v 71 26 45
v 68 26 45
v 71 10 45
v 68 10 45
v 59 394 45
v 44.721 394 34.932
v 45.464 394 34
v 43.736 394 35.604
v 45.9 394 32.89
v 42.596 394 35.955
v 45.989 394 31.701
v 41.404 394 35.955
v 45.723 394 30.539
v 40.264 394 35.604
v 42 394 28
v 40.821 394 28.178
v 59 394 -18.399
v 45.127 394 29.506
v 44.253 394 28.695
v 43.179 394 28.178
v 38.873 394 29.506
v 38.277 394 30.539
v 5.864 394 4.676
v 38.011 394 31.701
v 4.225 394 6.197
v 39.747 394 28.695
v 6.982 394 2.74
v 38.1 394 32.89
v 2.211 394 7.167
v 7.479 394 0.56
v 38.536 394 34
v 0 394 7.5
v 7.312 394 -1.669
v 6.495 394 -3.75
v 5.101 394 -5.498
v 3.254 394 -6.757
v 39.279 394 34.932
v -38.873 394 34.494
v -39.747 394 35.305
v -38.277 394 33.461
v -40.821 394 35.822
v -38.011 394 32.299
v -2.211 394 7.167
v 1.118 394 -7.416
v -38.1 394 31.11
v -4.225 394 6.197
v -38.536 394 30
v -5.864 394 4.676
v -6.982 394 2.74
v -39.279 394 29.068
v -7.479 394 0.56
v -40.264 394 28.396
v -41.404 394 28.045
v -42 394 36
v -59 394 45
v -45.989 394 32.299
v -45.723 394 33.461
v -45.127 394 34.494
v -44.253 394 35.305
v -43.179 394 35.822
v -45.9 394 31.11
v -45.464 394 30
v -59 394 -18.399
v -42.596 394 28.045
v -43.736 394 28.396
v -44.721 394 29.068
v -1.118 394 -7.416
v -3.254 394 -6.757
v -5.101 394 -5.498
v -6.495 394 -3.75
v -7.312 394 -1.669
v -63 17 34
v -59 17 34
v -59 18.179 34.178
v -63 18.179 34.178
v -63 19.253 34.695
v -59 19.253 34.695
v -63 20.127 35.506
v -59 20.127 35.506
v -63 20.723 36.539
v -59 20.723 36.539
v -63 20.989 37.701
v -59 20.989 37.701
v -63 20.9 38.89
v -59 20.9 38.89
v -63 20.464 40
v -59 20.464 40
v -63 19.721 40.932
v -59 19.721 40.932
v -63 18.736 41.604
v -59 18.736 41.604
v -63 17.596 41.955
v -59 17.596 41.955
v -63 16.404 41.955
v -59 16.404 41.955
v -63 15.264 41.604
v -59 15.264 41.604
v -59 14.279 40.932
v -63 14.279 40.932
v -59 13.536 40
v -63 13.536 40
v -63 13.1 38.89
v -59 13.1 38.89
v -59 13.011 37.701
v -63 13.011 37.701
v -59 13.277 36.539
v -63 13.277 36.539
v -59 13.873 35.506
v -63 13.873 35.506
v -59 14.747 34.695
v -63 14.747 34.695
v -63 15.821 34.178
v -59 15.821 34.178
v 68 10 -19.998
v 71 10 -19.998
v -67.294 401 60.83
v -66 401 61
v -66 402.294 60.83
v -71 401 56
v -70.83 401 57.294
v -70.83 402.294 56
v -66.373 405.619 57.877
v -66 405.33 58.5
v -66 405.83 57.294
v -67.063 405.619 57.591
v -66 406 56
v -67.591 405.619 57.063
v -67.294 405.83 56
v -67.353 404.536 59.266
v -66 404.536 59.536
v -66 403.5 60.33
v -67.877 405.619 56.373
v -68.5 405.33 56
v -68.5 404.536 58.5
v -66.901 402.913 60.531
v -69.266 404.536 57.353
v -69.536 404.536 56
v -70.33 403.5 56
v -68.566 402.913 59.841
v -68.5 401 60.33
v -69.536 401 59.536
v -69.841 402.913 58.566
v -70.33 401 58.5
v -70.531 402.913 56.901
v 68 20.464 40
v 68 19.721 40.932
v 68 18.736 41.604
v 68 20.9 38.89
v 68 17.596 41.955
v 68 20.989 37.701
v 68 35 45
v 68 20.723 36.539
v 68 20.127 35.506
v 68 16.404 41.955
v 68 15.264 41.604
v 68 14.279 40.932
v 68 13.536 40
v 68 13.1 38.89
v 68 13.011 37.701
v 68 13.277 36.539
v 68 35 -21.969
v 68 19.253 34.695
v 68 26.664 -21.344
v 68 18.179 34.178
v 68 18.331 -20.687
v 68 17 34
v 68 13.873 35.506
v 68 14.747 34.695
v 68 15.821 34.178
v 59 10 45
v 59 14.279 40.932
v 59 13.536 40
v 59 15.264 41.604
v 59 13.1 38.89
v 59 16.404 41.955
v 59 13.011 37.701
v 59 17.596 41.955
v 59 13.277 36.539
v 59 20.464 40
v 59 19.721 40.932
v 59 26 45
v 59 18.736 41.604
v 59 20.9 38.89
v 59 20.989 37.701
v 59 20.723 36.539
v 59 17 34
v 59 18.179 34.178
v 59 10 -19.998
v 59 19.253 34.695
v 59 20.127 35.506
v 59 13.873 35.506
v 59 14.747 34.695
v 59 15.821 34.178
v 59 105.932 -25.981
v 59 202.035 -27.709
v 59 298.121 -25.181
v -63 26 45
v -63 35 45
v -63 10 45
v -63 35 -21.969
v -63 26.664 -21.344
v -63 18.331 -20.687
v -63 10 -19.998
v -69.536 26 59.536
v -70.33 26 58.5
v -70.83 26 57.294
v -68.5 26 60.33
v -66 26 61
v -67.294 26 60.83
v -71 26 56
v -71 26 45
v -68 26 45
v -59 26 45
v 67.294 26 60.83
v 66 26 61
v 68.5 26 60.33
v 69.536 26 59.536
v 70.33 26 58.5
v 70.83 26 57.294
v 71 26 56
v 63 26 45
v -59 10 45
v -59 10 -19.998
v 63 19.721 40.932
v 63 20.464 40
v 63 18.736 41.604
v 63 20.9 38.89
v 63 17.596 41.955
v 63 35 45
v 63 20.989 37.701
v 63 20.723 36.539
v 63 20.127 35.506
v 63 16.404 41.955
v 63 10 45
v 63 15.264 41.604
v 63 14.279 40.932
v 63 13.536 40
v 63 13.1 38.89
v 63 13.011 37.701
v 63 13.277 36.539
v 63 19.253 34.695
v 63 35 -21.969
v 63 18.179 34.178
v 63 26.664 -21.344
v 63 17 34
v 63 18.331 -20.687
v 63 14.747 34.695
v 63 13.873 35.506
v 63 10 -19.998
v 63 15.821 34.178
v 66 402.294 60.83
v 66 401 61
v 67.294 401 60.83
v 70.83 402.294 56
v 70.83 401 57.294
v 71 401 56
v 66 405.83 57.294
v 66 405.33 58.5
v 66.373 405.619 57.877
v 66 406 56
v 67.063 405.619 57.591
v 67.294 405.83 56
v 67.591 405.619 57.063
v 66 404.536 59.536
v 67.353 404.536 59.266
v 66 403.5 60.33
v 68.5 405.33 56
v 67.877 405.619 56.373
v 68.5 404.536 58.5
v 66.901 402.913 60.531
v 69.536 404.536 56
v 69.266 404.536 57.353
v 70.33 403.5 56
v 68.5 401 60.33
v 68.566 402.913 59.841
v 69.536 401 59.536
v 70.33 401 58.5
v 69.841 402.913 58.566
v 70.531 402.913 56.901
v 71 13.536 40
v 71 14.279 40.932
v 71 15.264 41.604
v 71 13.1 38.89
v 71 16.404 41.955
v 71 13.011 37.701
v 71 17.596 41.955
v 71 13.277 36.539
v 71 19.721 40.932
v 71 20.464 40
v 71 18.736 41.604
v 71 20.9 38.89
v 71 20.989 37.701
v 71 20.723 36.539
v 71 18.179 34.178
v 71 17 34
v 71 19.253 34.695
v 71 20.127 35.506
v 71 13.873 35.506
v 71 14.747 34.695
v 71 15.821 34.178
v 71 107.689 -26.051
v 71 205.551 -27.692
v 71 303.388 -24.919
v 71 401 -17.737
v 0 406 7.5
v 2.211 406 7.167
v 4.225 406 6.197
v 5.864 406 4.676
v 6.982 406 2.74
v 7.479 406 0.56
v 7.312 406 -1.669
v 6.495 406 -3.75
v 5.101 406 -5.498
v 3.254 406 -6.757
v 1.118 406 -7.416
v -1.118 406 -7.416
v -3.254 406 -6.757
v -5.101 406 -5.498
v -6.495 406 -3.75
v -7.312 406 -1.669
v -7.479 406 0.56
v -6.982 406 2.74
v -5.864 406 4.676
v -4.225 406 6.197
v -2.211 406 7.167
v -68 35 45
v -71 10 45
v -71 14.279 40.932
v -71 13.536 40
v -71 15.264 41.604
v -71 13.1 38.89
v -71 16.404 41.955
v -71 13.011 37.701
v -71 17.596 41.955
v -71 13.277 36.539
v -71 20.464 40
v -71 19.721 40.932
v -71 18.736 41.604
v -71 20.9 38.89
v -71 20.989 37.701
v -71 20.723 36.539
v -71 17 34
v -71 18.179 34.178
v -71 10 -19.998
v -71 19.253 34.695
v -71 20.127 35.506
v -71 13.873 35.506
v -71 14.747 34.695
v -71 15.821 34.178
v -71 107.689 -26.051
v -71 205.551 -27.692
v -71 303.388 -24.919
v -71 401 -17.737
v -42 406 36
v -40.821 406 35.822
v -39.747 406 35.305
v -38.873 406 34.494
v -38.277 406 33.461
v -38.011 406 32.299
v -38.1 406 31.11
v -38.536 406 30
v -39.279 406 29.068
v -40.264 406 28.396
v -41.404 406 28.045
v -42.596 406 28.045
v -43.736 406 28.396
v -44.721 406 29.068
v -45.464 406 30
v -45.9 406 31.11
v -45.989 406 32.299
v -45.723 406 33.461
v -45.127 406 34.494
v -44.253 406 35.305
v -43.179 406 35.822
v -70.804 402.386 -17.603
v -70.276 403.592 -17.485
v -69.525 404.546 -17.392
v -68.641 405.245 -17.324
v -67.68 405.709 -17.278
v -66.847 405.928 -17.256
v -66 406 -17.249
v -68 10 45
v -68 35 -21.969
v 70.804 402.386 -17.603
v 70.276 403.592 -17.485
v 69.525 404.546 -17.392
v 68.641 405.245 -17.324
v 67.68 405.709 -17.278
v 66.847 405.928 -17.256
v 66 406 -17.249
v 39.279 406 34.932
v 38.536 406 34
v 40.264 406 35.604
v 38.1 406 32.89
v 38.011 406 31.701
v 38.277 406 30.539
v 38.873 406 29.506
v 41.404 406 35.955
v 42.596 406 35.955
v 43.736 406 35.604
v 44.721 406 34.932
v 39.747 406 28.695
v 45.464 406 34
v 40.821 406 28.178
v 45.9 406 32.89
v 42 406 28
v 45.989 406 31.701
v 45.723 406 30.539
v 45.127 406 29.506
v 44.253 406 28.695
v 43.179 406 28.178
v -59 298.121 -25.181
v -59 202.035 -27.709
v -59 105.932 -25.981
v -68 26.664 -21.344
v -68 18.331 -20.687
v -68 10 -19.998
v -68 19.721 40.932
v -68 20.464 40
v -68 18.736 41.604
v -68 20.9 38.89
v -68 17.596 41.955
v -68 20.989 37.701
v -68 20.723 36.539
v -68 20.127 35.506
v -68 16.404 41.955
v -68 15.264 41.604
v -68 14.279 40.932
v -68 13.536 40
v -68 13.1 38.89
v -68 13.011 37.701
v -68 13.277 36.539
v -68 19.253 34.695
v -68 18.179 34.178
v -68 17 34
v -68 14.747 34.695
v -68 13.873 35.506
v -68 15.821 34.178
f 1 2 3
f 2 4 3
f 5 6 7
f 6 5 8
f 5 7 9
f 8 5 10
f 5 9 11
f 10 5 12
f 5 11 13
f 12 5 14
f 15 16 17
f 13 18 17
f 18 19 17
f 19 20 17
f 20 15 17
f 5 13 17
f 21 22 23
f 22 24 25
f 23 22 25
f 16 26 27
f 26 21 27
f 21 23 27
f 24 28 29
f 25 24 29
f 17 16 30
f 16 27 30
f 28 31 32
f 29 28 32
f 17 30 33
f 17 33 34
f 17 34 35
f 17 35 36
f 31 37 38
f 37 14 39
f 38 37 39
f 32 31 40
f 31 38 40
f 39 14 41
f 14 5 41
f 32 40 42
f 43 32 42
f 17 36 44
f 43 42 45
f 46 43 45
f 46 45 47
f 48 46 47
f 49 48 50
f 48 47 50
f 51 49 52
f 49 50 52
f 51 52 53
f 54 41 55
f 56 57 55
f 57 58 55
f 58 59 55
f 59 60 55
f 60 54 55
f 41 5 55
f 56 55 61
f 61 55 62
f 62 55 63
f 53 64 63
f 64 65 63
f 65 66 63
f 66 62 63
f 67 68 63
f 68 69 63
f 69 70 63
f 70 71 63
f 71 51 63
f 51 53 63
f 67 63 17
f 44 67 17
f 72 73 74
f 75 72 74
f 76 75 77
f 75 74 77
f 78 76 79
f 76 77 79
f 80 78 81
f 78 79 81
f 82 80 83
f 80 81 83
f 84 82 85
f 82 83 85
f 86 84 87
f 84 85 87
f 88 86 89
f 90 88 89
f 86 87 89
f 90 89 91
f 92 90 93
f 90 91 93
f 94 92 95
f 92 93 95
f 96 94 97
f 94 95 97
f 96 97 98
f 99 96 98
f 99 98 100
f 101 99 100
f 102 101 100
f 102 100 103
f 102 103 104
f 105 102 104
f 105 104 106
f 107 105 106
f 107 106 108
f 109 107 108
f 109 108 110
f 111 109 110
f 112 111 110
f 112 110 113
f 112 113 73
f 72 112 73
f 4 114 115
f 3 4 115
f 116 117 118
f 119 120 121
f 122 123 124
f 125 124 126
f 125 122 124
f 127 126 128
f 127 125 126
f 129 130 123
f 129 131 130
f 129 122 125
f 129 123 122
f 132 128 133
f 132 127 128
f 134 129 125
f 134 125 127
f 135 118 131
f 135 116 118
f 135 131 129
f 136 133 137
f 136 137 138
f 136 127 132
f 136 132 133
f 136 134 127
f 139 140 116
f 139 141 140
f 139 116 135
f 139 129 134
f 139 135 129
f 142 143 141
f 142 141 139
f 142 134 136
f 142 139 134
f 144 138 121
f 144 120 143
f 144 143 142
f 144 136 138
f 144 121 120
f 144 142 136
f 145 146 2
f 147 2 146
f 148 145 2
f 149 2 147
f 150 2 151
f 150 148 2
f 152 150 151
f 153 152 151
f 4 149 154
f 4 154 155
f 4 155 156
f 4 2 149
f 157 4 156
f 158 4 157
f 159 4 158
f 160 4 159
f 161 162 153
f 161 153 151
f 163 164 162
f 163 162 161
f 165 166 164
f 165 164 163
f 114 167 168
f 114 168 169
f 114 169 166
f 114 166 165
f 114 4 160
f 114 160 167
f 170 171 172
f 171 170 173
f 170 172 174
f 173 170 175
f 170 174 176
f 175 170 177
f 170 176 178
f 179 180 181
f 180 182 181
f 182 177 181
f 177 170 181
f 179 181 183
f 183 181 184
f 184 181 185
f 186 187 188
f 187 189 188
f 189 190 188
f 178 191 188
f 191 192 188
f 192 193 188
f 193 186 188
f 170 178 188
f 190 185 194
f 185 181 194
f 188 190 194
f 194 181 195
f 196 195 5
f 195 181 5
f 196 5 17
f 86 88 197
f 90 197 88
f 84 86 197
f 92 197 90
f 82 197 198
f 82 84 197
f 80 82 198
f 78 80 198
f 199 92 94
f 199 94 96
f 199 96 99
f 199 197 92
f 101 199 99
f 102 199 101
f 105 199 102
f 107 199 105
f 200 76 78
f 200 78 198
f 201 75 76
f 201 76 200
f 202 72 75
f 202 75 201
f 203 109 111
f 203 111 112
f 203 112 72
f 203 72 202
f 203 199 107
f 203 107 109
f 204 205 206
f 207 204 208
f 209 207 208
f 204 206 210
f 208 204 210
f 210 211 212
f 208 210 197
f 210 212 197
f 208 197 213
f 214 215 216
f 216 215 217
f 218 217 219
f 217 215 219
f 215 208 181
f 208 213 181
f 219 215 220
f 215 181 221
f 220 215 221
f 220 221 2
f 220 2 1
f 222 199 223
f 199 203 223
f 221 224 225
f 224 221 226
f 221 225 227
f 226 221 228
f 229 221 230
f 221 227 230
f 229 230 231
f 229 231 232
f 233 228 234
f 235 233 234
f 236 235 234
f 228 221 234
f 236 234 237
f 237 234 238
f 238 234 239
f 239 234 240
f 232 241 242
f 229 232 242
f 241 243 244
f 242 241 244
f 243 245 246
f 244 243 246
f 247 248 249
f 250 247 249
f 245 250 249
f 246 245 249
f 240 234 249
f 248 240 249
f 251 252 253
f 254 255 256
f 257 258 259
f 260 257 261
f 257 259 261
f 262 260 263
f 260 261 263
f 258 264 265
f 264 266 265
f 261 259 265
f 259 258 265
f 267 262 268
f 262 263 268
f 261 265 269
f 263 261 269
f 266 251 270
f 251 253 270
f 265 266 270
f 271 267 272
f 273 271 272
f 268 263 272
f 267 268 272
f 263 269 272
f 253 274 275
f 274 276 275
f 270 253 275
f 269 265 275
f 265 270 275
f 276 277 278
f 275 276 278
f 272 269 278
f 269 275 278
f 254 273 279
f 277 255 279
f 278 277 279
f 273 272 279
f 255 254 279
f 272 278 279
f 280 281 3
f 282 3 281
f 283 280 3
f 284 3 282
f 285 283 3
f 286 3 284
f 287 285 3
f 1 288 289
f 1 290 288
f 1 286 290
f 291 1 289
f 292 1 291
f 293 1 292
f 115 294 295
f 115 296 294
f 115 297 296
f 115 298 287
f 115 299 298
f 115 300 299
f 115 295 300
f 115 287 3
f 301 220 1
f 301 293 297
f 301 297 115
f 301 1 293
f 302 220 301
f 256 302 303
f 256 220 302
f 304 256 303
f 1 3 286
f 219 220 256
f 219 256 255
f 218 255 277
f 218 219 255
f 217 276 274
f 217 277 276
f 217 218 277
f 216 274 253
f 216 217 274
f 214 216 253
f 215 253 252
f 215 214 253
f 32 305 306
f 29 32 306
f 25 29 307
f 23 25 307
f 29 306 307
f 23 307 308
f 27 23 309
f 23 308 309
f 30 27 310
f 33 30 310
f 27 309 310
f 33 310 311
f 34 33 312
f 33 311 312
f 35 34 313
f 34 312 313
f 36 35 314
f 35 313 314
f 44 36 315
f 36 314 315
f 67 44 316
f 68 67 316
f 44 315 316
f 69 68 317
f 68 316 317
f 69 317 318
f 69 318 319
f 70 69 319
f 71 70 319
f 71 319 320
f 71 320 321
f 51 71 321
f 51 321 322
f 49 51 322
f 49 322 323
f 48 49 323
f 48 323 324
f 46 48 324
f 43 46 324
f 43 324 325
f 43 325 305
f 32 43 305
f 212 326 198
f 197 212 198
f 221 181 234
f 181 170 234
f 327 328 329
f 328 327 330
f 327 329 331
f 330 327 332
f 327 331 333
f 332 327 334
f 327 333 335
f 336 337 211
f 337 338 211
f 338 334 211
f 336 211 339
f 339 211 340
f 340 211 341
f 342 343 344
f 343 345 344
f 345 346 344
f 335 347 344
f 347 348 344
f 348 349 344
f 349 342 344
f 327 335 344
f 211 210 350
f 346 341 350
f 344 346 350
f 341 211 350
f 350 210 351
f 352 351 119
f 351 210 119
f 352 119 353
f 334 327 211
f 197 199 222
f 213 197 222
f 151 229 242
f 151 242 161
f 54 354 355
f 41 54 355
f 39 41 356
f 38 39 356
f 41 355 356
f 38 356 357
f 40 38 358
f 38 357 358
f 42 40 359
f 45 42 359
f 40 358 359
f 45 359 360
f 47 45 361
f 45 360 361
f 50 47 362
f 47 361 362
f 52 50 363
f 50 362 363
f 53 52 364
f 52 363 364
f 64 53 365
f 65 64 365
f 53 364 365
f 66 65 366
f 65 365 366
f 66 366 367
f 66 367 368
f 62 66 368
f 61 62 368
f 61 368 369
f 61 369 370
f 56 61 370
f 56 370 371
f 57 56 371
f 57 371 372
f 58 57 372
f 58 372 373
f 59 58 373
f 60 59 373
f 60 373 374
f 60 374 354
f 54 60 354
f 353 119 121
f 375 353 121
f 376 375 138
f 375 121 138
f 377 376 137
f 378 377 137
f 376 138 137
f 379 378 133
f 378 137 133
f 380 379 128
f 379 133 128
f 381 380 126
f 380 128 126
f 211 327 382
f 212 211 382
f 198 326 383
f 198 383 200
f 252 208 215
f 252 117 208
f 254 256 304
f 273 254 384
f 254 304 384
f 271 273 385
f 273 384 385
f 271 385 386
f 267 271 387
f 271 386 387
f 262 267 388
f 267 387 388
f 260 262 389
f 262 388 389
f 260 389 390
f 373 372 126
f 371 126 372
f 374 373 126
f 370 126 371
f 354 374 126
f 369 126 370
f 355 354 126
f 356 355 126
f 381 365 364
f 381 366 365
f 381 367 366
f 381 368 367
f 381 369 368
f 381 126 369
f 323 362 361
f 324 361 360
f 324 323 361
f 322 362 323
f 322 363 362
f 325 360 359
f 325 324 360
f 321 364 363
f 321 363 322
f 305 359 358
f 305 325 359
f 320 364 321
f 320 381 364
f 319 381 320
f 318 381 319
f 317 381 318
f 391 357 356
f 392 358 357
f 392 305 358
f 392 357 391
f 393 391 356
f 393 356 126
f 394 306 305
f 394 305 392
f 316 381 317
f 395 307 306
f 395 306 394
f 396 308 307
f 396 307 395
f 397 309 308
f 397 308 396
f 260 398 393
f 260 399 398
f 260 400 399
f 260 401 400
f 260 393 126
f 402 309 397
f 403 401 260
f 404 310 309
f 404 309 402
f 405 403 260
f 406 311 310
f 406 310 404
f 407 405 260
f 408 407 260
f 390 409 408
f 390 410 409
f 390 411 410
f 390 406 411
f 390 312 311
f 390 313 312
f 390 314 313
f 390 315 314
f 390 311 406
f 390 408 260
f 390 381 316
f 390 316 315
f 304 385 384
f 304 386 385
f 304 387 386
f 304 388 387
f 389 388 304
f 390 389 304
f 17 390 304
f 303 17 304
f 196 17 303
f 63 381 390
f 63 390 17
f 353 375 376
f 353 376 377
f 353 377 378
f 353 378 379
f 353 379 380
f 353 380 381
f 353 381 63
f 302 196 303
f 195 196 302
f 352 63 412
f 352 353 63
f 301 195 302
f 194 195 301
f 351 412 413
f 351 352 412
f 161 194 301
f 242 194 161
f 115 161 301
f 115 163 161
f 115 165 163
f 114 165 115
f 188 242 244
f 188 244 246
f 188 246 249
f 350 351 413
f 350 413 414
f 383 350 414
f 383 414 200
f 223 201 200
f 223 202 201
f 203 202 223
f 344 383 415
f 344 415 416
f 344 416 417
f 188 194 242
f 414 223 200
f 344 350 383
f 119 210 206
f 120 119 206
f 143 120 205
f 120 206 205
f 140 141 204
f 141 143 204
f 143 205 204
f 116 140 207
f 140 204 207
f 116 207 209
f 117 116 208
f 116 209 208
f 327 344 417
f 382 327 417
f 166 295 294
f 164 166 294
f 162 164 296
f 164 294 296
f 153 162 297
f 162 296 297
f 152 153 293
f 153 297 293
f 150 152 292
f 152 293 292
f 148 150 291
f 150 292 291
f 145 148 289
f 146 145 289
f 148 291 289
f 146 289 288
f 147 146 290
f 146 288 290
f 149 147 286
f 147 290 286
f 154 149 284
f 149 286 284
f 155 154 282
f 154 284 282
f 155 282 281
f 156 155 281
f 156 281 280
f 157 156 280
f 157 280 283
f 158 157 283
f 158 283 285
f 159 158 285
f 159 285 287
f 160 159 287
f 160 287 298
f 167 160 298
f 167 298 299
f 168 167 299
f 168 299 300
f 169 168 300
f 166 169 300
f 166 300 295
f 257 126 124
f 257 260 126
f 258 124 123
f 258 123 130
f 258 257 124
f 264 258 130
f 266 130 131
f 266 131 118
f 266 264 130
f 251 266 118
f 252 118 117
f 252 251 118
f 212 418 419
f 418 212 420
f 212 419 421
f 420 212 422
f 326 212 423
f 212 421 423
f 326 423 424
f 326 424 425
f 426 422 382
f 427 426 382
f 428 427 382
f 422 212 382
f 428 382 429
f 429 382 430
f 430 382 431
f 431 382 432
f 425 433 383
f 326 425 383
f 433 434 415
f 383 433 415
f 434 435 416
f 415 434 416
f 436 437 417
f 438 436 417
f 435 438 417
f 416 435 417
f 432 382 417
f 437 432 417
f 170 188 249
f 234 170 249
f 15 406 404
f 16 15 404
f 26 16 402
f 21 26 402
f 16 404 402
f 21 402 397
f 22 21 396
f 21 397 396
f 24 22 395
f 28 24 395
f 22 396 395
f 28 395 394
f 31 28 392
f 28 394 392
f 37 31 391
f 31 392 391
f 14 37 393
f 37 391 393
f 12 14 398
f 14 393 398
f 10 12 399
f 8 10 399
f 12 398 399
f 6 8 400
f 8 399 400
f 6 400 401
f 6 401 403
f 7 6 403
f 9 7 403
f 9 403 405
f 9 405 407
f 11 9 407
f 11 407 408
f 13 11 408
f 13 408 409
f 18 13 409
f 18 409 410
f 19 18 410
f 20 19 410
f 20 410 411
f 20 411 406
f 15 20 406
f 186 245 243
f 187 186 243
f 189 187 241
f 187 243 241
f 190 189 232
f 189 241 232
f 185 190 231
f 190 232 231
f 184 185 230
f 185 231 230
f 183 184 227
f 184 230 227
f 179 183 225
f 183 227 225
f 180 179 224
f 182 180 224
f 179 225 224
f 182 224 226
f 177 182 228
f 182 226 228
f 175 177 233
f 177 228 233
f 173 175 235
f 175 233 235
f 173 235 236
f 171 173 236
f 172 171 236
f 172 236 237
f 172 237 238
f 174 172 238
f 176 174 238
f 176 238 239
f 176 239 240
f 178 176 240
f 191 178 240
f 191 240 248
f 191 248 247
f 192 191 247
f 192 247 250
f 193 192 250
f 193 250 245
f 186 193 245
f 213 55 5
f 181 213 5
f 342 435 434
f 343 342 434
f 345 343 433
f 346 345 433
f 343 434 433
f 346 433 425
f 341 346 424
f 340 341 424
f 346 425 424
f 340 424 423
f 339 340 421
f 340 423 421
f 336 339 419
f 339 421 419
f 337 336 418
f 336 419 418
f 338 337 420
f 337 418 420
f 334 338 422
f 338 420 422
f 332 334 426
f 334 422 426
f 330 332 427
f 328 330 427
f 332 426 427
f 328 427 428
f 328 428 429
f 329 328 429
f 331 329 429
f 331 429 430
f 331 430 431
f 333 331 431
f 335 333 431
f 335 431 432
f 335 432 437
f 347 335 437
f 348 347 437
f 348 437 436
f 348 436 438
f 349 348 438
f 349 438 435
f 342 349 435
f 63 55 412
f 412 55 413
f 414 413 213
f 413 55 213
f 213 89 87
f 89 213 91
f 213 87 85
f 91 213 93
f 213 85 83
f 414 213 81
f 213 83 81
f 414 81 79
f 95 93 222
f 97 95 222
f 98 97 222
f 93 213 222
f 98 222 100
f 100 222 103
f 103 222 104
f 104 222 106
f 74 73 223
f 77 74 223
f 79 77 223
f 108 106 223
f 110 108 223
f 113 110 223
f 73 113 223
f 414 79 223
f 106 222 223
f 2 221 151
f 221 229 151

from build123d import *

# Parameters (mm, degrees)
CUT_EXTRUDE1_DEPTH      = 10
CUT_EXTRUDE1_DEPTH_BACK = 10
SKETCH7_W               = 161.67088451347962
SKETCH7_H               = 99.40268669666085
SKETCH8_W               = 4.999999999999993
SKETCH8_H               = 94
CUT_EXTRUDE2_DEPTH      = 35
SKETCH9_R               = 7.5
SKETCH9_R_2             = 4.000000000000013
SKETCH9_R_3             = 4.000000000000005
CUT_EXTRUDE3_DEPTH      = 405.82341829494015
SKETCH10_R              = 4.000000000000005
CUT_EXTRUDE4_DEPTH      = 433.4638713233743
SKETCH11_W              = 141.9999999999999
SKETCH11_H              = 16
BOSS_EXTRUDE1_DEPTH     = 380
FILLET2_R               = 5
FILLET3_R               = 5
FILLET4_R               = 5
FILLET5_R               = 5
FILLET6_R               = 5
CUT_EXTRUDE5_DEPTH      = 435.42030339292387


with BuildPart() as part:
    # Sweep2: sweep along a path in Sketch4
    with BuildLine(Plane.XY) as sweep2_path:
        Line((-65, 400), (-64.99999999999994, 10.000000000000007))
        ThreePointArc((-64.99999999999994, 10.000000000000007), (-62.07106781186544, 2.928932188134527), (-54.99999999999996, 0))
        Line((-54.99999999999996, 0), (54.99999999999999, 0))
        ThreePointArc((54.99999999999999, 0), (62.071067811865476, 2.9289321881345227), (65, 10))
        Line((65, 10), (65, 400))
        Line((65, 400), (-65, 400))
    # Sketch6 → Sweep2 (sweep)
    with BuildSketch(Plane(origin=(0, 0, 0), x_dir=(0, 0, -1), z_dir=(1, 0, 0))):
        Polygon((44.99999999999967, 406), (-45.00000000000032, 406), (-45.00000000000032, 393.99999999999994), (44.99999999999968, 394), align=None)
    sweep(path=sweep2_path.line, transition=Transition.RIGHT)

    # Sketch7 → Cut-Extrude1 (cut, two sides: drawn at the far end of the back side and taken through both)
    with BuildSketch(Plane(origin=(0, 0, 0), x_dir=(1, 0, 0), z_dir=(0, 1, 0)).offset(-CUT_EXTRUDE1_DEPTH_BACK)):
        Rectangle(SKETCH7_W, SKETCH7_H)
    extrude(amount=CUT_EXTRUDE1_DEPTH + CUT_EXTRUDE1_DEPTH_BACK, mode=Mode.SUBTRACT)

    # Sketch8 → Cut-Extrude2 (cut)
    with BuildSketch(Plane(origin=(0, 0, 0), x_dir=(1, 0, 0), z_dir=(0, 1, 0))):
        with Locations((-65.5, 0.24224418482823395)):
            Rectangle(SKETCH8_W, SKETCH8_H)
        with Locations((65.5, 0.24224418482823395)):
            Rectangle(SKETCH8_W, SKETCH8_H)
    extrude(amount=CUT_EXTRUDE2_DEPTH, mode=Mode.SUBTRACT)

    # Sketch9 → Cut-Extrude3 (cut, through all)
    with BuildSketch(Plane(origin=(0, 406, 0), x_dir=(1, 0, 0), z_dir=(0, 1, 0))):
        with Locations(Location((0, 0, 0), (0, 0, 270))):
            Circle(SKETCH9_R)
        with Locations(Location((-42, 31.999999999999993, 0), (0, 0, 270))):
            Circle(SKETCH9_R_2)
        with Locations(Location((-42, -32.00000000000001, 0), (0, 0, 270))):
            Circle(SKETCH9_R_3)
        with Locations(Location((42, -31.999999999999954, 0), (0, 0, 90))):
            Circle(SKETCH9_R_3)
        with Locations(Location((42, 32, 0), (0, 0, 90))):
            Circle(SKETCH9_R_2)
    extrude(amount=-CUT_EXTRUDE3_DEPTH, mode=Mode.SUBTRACT)

    # Sketch10 → Cut-Extrude4 (cut, through all)
    with BuildSketch(Plane(origin=(70.99999999999996, 0, 0), x_dir=(0, 0, -1), z_dir=(1, 0, 0))):
        with Locations((-37.999999999999936, 17.000000000000014)):
            Circle(SKETCH10_R)
    extrude(amount=-CUT_EXTRUDE4_DEPTH, mode=Mode.SUBTRACT)

    # Sketch11 → Boss-Extrude1 (add)
    with BuildSketch(Plane(origin=(0, 406, 0), x_dir=(1, 0, 0), z_dir=(0, 1, 0))):
        with Locations((0, -52.999999999999936)):
            Rectangle(SKETCH11_W, SKETCH11_H)
    extrude(amount=-BOSS_EXTRUDE1_DEPTH)

    # Fillet2
    fillet2_edges = [part.edges().sort_by_distance(p)[0] for p in [
        (59.00000000000001, 202, -44.99999999999968),
    ]]
    fillet(fillet2_edges, radius=FILLET2_R)

    # Fillet3
    fillet3_edges = [part.edges().sort_by_distance(p)[0] for p in [
        (71, 208, -44.99999999999967),
    ]]
    fillet(fillet3_edges, radius=FILLET3_R)

    # Fillet4
    fillet4_edges = [part.edges().sort_by_distance(p)[0] for p in [
        (-59.00000000000001, 202, -44.99999999999968),
    ]]
    fillet(fillet4_edges, radius=FILLET4_R)

    # Fillet5
    fillet5_edges = [part.edges().sort_by_distance(p)[0] for p in [
        (-71, 208, -44.99999999999967),
    ]]
    fillet(fillet5_edges, radius=FILLET5_R)

    # Fillet6
    fillet6_edges = [part.edges().sort_by_distance(p)[0] for p in [
        (70.99999999999994, 216, 60.999999999999936),
        (-70.99999999999994, 216, 60.999999999999936),
        (0, 406, 60.999999999999936),
        (0, 406, -44.99999999999967),
        (0, 406, -44.99999999999967),
        (70.99999999999997, 406, 10.500000000000085),
        (-70.99999999999997, 406, 10.500000000000135),
        (69.53553390593274, 406, -43.53553390593251),
        (-69.53553390593274, 406, -43.53553390593241),
    ]]
    fillet(fillet6_edges, radius=FILLET6_R)

    # Sketch12 → Cut-Extrude5 (cut, through all)
    with BuildSketch(Plane.ZY.offset(70.9999999999999)):
        with BuildLine():
            Line((-19.99811023879916, 9.999999999999995), (-79.77303285275339, 10.000000000000018))
            Line((-79.77303285275339, 10.000000000000018), (-79.77303285275339, 406.4421165391139))
            Line((-79.77303285275339, 406.4421165391139), (-17.24924979661946, 406))
            ThreePointArc((-17.24924979661946, 406), (-27.67595887590869, 208.0628369981441), (-19.99811023879916, 9.999999999999995))
        make_face()
    extrude(amount=-CUT_EXTRUDE5_DEPTH, mode=Mode.SUBTRACT)


solid = part.part
